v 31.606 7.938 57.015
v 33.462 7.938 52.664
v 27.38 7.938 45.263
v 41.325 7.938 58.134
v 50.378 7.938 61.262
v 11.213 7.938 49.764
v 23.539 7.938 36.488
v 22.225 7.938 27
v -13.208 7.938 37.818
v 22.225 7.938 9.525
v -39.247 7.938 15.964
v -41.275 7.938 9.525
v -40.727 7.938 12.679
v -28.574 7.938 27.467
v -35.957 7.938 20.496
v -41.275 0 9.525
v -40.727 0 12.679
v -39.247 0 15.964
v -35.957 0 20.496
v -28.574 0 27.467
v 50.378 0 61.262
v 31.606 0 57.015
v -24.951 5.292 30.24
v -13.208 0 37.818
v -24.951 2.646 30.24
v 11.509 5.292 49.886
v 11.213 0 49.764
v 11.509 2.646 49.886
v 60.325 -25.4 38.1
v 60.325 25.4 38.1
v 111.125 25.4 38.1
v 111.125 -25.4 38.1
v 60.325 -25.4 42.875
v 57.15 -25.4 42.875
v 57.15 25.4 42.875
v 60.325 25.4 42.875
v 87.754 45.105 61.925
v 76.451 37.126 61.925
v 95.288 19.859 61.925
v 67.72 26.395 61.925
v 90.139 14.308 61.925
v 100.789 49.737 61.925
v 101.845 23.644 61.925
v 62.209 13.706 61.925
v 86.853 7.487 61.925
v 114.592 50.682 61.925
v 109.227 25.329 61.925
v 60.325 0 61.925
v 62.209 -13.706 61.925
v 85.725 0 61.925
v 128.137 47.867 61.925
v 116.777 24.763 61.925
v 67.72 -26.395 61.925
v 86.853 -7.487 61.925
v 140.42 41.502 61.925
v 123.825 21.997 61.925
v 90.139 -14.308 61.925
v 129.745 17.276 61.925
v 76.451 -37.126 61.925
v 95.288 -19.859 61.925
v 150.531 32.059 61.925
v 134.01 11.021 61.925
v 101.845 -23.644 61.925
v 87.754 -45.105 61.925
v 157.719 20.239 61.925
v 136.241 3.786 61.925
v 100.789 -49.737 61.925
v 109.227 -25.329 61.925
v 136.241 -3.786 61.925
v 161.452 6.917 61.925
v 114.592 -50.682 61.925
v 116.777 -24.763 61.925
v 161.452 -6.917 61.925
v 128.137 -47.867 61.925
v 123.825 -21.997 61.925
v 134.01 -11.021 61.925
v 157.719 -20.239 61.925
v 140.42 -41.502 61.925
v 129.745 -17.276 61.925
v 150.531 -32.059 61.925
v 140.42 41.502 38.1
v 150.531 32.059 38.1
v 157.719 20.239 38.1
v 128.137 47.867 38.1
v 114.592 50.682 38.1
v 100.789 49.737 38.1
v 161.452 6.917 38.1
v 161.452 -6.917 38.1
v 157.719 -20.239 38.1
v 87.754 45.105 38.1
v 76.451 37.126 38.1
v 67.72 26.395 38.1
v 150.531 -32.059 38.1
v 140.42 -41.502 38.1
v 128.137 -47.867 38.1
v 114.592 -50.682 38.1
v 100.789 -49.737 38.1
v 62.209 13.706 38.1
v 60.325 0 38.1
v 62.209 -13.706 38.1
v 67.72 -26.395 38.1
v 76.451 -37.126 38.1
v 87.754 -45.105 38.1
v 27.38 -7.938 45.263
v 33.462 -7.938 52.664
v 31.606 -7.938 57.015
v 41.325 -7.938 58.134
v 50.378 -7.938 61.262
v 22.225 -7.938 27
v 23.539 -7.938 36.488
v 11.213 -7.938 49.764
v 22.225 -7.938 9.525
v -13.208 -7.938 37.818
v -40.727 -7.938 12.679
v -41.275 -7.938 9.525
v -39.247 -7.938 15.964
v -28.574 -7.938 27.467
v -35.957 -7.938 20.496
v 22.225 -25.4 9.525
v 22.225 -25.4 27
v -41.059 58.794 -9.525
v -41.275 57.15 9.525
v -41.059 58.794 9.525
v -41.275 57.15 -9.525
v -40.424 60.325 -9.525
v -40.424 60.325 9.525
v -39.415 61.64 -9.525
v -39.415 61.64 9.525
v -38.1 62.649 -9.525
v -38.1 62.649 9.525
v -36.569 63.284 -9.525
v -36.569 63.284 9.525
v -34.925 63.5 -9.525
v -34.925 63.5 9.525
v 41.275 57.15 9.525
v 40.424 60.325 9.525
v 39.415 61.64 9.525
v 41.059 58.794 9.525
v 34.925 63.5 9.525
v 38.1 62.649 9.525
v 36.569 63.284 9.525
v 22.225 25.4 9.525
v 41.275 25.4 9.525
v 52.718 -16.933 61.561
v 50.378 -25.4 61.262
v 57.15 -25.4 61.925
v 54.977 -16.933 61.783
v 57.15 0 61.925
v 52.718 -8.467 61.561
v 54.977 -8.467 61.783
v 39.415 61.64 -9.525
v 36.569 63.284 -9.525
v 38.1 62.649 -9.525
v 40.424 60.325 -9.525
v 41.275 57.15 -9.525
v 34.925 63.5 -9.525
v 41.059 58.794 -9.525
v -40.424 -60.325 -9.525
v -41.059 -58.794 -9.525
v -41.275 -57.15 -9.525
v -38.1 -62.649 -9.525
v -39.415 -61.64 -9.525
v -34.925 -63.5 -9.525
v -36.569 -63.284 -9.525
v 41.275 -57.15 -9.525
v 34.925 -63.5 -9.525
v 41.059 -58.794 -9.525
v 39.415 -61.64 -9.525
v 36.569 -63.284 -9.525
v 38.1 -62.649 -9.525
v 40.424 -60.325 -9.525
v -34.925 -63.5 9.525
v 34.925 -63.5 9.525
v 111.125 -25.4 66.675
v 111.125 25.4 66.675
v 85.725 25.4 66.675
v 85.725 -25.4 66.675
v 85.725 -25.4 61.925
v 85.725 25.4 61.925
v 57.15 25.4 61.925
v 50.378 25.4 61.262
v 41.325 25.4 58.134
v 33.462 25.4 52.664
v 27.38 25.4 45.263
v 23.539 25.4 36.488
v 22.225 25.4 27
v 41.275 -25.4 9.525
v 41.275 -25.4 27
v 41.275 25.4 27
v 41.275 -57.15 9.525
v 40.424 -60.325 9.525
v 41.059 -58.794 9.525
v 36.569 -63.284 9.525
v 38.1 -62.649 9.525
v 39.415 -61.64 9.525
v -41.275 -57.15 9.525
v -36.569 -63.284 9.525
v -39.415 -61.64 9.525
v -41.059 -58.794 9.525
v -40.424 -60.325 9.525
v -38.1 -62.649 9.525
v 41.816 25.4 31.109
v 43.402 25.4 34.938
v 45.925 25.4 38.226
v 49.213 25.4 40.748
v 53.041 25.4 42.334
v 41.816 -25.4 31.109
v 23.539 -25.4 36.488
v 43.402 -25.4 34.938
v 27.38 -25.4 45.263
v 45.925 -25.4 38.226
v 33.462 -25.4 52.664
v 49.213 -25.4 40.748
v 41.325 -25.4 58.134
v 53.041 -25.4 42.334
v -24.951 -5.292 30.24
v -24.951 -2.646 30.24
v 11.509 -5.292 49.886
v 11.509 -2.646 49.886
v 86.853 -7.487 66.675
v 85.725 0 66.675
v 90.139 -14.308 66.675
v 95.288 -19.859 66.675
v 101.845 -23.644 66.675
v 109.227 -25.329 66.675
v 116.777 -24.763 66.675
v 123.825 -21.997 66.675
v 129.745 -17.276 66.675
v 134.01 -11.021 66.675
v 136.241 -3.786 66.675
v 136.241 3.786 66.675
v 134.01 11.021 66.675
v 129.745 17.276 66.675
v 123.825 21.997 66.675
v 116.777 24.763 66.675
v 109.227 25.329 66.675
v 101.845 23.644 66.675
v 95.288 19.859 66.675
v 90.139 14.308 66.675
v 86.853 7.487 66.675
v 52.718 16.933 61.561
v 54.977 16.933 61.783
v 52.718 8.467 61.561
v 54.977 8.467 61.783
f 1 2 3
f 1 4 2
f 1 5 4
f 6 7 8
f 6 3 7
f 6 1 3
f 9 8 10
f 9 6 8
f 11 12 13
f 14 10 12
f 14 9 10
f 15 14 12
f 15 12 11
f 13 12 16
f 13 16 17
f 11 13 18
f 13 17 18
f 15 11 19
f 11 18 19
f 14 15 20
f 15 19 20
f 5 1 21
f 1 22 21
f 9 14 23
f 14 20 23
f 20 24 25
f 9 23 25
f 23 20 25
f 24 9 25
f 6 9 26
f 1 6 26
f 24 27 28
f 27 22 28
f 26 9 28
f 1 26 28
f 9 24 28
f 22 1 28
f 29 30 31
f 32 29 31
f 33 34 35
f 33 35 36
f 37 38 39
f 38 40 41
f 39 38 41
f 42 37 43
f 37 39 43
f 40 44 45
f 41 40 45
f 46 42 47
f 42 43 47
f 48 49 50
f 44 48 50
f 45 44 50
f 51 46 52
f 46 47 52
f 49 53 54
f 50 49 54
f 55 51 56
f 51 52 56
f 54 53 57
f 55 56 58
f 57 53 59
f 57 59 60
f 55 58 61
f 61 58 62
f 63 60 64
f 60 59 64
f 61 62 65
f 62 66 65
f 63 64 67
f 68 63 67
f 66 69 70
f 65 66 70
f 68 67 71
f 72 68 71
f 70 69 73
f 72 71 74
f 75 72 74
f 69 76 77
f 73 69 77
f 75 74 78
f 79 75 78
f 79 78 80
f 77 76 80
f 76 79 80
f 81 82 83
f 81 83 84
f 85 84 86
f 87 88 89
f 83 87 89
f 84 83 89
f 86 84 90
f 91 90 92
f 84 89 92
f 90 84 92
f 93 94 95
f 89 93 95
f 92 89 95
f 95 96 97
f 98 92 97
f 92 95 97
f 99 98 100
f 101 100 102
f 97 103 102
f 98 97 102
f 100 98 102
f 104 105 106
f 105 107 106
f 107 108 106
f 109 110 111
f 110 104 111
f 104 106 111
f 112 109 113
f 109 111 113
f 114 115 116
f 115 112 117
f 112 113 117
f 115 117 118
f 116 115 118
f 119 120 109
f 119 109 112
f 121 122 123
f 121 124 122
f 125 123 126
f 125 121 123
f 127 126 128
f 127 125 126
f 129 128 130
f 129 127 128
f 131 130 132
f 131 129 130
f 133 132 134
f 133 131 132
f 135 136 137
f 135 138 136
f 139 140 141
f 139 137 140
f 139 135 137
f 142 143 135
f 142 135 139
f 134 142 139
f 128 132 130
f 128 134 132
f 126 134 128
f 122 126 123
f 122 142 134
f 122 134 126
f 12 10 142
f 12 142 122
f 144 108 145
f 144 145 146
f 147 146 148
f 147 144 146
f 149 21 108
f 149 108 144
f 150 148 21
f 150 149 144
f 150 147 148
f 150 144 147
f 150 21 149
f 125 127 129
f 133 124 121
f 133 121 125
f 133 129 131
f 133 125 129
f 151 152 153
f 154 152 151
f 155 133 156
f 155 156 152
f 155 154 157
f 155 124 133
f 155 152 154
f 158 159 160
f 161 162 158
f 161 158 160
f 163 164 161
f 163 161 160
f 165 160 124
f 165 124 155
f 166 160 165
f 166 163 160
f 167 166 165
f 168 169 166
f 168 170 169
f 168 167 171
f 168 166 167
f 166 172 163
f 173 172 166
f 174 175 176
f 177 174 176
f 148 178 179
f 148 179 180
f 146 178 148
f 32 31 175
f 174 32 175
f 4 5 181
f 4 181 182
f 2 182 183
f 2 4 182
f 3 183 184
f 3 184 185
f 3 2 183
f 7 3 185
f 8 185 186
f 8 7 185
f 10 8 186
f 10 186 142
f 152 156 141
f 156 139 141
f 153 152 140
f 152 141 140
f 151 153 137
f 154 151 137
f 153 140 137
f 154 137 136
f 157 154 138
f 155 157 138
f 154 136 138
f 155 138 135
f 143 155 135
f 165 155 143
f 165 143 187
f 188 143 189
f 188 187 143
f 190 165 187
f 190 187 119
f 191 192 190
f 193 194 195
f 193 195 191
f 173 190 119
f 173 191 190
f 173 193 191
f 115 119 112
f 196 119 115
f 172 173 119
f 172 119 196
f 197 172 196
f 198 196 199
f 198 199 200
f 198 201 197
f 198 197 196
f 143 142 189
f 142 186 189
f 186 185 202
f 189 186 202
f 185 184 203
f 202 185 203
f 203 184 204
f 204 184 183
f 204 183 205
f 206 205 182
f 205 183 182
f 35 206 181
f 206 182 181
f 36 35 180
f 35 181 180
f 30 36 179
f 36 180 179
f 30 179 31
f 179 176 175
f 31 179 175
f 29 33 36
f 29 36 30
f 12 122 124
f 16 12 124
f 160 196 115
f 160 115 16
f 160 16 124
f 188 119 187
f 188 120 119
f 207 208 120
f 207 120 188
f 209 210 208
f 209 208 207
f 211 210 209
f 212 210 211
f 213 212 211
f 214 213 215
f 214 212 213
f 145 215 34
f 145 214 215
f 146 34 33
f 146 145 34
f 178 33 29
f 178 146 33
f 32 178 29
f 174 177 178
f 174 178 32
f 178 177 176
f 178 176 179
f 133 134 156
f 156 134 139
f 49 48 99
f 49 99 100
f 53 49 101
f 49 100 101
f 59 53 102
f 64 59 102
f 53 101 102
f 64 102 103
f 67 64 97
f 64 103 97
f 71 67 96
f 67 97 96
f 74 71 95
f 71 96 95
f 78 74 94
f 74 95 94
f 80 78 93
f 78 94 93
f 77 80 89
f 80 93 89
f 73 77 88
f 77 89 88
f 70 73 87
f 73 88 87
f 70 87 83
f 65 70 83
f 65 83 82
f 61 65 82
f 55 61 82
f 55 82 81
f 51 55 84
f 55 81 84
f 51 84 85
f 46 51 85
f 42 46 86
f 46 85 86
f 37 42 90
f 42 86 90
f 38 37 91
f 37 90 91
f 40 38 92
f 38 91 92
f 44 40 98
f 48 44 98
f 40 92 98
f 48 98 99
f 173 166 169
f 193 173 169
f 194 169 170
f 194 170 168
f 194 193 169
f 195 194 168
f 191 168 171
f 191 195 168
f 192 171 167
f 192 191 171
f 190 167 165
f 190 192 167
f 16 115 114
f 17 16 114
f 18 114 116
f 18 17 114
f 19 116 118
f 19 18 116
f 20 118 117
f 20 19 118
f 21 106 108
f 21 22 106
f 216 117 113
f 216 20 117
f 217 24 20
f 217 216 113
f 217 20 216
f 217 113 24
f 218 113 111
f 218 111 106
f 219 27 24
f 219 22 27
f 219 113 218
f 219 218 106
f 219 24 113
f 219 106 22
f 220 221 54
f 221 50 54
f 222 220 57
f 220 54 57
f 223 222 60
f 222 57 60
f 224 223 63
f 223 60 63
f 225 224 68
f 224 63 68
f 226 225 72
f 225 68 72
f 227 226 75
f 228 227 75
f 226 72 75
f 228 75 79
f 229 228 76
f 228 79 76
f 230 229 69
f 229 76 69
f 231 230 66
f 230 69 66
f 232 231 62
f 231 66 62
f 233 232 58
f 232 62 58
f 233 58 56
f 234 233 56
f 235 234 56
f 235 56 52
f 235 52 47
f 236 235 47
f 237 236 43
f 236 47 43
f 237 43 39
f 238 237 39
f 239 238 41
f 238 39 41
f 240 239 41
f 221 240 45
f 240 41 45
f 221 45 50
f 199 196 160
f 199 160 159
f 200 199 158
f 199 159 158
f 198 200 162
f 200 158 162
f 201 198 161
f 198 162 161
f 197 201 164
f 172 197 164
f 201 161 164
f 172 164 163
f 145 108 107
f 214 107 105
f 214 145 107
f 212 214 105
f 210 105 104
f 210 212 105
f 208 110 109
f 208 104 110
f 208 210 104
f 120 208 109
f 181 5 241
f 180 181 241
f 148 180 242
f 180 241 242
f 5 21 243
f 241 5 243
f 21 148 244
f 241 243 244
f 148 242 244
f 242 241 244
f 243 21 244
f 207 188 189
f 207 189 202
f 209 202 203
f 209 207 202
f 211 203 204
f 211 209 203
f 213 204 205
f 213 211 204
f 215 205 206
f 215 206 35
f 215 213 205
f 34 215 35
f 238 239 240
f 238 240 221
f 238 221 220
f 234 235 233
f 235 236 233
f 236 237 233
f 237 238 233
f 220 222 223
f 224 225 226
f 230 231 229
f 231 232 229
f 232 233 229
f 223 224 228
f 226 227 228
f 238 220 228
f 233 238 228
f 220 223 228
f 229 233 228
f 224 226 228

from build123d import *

# Parameters (mm, degrees)
F1_DEPTH = 63.5
F2_DEPTH = 25.4
F3_DEPTH = 7.9375
F5_R     = 6.35


with BuildPart() as f1:
    # F0 (on Front) → F1 (new body, symmetric)
    with BuildSketch(Plane.XZ):
        Polygon((-41.275, 9.525), (-41.275, -9.525), (41.275, -9.525), (41.275, 9.525), (22.225, 9.525), align=None)
    extrude(amount=F1_DEPTH, both=True)

    # F0 (on Front) → F2 (join, symmetric)
    with BuildSketch(Plane.XZ):
        with BuildLine():
            Line((22.225, 9.525), (41.275, 9.525))
            Line((41.275, 9.525), (41.275, 27.0002))
            ThreePointArc((41.275, 27.0002), (45.92468, 38.22552), (57.15, 42.8752))
            Line((57.15, 42.8752), (60.325, 42.8752))
            Line((60.325, 42.8752), (60.325, 61.9252))
            Line((60.325, 61.9252), (57.15, 61.9252))
            add(Edge.make_bspline(
                [(50.378043, 61.262369), (52.755617, 61.599331), (55.021899, 61.823915), (57.15, 61.9252)],
                knots=[104.249489, 104.249489, 104.249489, 104.249489, 111.504536, 111.504536, 111.504536, 111.504536], degree=3))
            ThreePointArc((50.378043, 61.262369), (30.166058, 49.172762), (22.225, 27.0002))
            Line((22.225, 27.0002), (22.225, 9.525))
        make_face()
        Polygon((85.725, 61.9252), (60.325, 61.9252), (60.325, 42.8752), (60.325, 38.1), (111.125, 38.1), (111.125, 66.675), (85.725, 66.675), align=None)
    extrude(amount=F2_DEPTH, both=True)

    # F0 (on Front) → F3 (join, symmetric)
    with BuildSketch(Plane.XZ):
        with BuildLine():
            add(Edge.make_bspline(
                [(-41.275, 9.525), (-40.928833, 28.375253), (16.214118, 56.42048), (50.378043, 61.262369)],
                knots=[0, 0, 0, 0, 104.249489, 104.249489, 104.249489, 104.249489], degree=3))
            Line((-41.275, 9.525), (22.225, 9.525))
            Line((22.225, 9.525), (22.225, 27.0002))
            ThreePointArc((22.225, 27.0002), (30.166058, 49.172762), (50.378043, 61.262369))
        make_face()
    extrude(amount=F3_DEPTH, both=True)

    # F5
    f5_edges = [f1.edges().sort_by_distance(p)[0] for p in [
        (-41.275, -63.5, 0),
        (41.275, -63.5, 0),
        (41.275, 63.5, 0),
        (-41.275, 63.5, 0),
    ]]
    fillet(f5_edges, radius=F5_R)


with BuildPart() as f4:
    # F0 (on Front) → F4 (revolve)
    with BuildSketch(Plane.XZ):
        Polygon((85.725, 61.9252), (60.325, 61.9252), (60.325, 42.8752), (60.325, 38.1), (111.125, 38.1), (111.125, 66.675), (85.725, 66.675), align=None)
    revolve(axis=Axis((111.125, 0, 52.3875), (0, 0, 1)))


solid = Compound([f1.part, f4.part])
